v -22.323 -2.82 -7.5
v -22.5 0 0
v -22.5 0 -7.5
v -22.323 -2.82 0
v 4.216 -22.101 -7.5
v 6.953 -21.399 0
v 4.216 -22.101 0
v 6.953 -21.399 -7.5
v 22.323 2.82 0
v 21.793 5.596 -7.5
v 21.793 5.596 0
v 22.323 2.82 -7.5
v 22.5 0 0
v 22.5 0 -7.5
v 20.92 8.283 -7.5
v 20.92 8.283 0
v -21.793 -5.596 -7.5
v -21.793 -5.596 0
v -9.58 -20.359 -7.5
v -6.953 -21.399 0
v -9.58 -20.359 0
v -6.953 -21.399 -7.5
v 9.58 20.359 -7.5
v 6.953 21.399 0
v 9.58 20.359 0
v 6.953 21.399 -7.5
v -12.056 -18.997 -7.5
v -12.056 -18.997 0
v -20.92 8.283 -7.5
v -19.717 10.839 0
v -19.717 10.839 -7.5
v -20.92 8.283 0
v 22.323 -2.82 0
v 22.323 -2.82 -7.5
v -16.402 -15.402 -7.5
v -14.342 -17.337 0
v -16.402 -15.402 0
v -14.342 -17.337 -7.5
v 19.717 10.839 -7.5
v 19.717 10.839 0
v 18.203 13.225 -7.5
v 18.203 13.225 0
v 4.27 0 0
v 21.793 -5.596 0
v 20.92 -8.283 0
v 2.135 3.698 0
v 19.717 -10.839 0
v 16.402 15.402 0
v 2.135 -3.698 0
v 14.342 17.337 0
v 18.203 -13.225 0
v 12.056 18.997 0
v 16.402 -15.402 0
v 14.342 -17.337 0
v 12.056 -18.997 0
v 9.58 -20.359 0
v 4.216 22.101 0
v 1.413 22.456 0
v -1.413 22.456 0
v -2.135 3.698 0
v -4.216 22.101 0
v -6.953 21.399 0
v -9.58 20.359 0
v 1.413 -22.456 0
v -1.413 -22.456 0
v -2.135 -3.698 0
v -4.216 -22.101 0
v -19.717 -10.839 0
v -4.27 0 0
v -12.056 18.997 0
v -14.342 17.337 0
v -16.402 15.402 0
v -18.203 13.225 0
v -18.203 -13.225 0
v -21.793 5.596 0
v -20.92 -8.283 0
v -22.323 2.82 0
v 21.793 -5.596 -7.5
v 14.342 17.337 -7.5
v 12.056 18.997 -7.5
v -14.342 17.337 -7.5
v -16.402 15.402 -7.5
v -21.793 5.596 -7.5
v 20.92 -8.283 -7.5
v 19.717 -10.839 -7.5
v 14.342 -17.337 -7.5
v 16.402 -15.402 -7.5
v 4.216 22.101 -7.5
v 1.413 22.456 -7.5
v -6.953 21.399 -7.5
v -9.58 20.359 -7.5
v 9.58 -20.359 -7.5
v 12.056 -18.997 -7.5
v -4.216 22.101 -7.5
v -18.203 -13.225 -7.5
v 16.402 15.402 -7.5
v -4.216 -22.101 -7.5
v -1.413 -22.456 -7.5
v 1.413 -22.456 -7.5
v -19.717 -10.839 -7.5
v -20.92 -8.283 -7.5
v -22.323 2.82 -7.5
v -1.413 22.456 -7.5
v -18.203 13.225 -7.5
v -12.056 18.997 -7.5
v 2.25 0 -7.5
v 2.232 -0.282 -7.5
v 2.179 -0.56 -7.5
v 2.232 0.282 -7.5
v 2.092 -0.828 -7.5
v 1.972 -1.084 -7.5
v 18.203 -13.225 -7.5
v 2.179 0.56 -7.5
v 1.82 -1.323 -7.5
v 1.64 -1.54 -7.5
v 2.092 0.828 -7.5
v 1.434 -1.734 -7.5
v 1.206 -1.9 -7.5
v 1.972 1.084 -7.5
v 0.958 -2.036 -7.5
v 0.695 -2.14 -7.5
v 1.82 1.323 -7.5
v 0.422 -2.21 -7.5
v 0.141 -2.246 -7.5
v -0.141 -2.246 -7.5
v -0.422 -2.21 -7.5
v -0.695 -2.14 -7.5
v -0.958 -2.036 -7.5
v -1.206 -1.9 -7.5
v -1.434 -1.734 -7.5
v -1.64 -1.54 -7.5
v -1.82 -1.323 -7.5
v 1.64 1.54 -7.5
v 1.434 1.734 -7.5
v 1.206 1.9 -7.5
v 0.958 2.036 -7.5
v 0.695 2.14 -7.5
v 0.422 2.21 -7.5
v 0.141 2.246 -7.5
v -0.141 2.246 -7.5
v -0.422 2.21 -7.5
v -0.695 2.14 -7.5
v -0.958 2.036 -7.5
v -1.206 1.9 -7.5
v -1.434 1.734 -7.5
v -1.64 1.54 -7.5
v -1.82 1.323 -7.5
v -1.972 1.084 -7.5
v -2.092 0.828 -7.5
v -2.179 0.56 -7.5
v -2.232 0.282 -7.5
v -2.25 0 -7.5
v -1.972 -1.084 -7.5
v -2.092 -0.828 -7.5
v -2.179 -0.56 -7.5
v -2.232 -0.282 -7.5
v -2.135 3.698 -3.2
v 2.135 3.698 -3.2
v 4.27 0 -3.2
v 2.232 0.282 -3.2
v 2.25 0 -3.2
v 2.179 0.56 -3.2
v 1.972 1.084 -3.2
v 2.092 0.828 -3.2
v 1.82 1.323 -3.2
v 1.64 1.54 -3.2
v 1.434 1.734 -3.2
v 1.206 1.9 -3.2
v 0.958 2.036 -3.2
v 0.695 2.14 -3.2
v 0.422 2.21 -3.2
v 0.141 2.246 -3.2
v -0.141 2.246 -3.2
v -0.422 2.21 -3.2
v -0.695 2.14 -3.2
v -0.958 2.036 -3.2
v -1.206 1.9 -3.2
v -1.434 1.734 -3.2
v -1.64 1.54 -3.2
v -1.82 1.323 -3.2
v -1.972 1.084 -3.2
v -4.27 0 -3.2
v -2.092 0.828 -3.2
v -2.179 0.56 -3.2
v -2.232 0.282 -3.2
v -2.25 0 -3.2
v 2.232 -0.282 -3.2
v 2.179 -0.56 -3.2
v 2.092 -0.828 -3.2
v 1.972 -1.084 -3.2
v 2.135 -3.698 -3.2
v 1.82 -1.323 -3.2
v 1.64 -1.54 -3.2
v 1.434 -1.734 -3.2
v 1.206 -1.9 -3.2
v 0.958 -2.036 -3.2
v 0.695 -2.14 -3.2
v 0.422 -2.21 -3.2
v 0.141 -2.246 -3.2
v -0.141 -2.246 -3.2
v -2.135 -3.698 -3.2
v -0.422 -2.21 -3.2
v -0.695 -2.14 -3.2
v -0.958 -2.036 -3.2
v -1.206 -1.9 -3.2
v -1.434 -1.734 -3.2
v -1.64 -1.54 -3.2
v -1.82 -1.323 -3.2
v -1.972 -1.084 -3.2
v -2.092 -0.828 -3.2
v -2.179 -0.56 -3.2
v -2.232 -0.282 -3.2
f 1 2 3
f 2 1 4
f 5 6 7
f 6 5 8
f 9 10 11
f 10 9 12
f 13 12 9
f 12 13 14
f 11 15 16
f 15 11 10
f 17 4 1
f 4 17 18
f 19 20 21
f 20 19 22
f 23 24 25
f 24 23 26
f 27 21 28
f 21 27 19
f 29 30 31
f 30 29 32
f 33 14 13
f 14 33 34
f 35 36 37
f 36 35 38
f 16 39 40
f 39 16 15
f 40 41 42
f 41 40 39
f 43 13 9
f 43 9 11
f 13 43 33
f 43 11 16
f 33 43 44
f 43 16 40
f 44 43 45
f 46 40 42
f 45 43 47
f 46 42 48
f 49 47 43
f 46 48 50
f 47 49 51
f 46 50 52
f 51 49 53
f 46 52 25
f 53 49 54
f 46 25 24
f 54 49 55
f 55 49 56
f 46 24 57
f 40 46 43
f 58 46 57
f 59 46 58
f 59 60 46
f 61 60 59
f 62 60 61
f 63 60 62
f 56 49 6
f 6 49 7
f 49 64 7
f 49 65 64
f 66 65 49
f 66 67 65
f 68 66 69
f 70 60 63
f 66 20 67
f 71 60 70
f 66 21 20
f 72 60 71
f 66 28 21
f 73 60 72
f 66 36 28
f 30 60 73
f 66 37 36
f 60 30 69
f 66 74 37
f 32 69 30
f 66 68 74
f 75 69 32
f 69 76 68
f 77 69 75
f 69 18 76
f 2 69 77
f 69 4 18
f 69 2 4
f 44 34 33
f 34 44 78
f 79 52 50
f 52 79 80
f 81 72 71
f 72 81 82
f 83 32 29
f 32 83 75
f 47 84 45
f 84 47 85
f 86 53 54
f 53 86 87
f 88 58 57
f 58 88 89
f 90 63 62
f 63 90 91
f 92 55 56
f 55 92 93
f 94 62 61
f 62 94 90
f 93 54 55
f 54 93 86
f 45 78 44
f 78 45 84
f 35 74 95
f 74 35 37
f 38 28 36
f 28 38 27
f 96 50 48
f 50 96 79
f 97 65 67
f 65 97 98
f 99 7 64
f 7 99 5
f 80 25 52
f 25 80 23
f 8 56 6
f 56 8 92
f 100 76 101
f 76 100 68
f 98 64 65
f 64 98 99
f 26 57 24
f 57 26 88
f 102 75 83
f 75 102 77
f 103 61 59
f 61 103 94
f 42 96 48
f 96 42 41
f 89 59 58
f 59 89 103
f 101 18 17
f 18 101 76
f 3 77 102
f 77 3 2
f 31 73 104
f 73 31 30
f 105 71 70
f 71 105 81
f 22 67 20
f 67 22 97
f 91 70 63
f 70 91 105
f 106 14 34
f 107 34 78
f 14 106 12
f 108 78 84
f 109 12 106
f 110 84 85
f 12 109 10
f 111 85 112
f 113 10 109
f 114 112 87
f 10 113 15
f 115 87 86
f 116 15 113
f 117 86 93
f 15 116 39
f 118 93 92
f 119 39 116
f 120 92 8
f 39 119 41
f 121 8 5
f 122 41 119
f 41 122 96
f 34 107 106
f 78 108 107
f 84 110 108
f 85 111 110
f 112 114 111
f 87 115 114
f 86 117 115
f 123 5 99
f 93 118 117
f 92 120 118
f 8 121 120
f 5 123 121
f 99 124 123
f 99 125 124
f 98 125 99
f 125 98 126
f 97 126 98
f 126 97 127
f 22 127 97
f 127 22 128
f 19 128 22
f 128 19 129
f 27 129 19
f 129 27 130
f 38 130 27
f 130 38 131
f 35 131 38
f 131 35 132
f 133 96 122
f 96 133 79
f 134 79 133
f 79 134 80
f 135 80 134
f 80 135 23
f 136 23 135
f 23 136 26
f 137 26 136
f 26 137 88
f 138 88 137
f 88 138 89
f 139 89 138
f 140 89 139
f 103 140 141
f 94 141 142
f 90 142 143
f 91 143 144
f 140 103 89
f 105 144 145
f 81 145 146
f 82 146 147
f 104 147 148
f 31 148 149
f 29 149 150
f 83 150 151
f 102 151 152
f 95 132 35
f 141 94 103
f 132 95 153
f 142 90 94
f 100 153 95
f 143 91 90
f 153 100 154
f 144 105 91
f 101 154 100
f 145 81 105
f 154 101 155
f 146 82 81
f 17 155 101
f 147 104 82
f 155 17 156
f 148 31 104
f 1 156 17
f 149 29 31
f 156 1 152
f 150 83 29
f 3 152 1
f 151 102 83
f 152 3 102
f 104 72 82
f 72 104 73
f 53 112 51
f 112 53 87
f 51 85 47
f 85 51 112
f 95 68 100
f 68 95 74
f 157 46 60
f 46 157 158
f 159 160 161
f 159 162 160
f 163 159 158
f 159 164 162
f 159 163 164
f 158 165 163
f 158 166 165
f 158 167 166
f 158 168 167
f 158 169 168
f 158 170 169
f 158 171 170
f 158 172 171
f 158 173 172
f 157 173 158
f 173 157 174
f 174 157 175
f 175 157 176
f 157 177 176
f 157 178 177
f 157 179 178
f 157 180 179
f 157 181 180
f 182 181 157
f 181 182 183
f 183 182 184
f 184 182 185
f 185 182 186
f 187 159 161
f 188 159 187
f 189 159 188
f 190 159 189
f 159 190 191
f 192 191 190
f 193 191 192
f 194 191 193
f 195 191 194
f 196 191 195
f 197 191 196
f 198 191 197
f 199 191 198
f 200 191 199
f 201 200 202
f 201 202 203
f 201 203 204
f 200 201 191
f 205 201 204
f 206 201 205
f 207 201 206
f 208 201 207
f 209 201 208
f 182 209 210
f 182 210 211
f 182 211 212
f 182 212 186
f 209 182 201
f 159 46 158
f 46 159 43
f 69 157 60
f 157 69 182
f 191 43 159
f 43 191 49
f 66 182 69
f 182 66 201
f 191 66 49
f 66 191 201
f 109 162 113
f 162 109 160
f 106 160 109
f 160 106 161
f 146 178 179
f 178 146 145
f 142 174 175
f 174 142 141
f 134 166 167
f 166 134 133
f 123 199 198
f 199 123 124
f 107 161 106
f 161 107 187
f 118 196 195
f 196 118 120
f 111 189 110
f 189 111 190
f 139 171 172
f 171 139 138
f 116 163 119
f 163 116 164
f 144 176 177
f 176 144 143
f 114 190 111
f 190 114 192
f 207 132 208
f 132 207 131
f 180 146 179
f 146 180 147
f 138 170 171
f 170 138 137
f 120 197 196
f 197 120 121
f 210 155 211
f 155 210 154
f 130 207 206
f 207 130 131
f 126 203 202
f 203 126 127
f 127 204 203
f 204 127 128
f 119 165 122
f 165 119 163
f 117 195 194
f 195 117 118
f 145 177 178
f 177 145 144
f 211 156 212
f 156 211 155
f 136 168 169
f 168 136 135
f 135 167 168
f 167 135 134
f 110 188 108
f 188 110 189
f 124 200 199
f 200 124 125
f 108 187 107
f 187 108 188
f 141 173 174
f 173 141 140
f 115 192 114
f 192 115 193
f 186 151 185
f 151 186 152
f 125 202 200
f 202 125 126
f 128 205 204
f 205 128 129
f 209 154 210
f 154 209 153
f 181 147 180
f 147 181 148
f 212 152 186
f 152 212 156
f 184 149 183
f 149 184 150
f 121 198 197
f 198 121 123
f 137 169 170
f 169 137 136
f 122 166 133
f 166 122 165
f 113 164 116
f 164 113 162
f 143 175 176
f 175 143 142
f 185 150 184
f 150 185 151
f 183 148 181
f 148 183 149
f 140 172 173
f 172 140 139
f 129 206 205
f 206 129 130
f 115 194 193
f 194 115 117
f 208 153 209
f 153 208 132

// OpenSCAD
$fn = 50;


difference() {
	union() {
		translate(v = [0, 0, -7.5000000000]) {
			cylinder(h = 7.5000000000, r = 22.5000000000);
		}
		translate(v = [0, 0, -6.0000000000]) {
			cylinder(h = 6, r = 2.8750000000);
		}
	}
	union() {
		translate(v = [0, 0, 0]) {
			rotate(a = [0, 0, 0]) {
				difference() {
					union() {
						translate(v = [0, 0, -3.2000000000]) {
							linear_extrude(height = 3.2000000000) {
								polygon(points = [[4.2698000000, 0.0000000000], [2.1349000000, 3.6977552691], [-2.1349000000, 3.6977552691], [-4.2698000000, 0.0000000000], [-2.1349000000, -3.6977552691], [2.1349000000, -3.6977552691]]);
							}
						}
					}
					union();
				}
			}
		}
		#translate(v = [0, 0, -100.0000000000]) {
			cylinder(h = 200, r = 2.2500000000);
		}
	}
}
